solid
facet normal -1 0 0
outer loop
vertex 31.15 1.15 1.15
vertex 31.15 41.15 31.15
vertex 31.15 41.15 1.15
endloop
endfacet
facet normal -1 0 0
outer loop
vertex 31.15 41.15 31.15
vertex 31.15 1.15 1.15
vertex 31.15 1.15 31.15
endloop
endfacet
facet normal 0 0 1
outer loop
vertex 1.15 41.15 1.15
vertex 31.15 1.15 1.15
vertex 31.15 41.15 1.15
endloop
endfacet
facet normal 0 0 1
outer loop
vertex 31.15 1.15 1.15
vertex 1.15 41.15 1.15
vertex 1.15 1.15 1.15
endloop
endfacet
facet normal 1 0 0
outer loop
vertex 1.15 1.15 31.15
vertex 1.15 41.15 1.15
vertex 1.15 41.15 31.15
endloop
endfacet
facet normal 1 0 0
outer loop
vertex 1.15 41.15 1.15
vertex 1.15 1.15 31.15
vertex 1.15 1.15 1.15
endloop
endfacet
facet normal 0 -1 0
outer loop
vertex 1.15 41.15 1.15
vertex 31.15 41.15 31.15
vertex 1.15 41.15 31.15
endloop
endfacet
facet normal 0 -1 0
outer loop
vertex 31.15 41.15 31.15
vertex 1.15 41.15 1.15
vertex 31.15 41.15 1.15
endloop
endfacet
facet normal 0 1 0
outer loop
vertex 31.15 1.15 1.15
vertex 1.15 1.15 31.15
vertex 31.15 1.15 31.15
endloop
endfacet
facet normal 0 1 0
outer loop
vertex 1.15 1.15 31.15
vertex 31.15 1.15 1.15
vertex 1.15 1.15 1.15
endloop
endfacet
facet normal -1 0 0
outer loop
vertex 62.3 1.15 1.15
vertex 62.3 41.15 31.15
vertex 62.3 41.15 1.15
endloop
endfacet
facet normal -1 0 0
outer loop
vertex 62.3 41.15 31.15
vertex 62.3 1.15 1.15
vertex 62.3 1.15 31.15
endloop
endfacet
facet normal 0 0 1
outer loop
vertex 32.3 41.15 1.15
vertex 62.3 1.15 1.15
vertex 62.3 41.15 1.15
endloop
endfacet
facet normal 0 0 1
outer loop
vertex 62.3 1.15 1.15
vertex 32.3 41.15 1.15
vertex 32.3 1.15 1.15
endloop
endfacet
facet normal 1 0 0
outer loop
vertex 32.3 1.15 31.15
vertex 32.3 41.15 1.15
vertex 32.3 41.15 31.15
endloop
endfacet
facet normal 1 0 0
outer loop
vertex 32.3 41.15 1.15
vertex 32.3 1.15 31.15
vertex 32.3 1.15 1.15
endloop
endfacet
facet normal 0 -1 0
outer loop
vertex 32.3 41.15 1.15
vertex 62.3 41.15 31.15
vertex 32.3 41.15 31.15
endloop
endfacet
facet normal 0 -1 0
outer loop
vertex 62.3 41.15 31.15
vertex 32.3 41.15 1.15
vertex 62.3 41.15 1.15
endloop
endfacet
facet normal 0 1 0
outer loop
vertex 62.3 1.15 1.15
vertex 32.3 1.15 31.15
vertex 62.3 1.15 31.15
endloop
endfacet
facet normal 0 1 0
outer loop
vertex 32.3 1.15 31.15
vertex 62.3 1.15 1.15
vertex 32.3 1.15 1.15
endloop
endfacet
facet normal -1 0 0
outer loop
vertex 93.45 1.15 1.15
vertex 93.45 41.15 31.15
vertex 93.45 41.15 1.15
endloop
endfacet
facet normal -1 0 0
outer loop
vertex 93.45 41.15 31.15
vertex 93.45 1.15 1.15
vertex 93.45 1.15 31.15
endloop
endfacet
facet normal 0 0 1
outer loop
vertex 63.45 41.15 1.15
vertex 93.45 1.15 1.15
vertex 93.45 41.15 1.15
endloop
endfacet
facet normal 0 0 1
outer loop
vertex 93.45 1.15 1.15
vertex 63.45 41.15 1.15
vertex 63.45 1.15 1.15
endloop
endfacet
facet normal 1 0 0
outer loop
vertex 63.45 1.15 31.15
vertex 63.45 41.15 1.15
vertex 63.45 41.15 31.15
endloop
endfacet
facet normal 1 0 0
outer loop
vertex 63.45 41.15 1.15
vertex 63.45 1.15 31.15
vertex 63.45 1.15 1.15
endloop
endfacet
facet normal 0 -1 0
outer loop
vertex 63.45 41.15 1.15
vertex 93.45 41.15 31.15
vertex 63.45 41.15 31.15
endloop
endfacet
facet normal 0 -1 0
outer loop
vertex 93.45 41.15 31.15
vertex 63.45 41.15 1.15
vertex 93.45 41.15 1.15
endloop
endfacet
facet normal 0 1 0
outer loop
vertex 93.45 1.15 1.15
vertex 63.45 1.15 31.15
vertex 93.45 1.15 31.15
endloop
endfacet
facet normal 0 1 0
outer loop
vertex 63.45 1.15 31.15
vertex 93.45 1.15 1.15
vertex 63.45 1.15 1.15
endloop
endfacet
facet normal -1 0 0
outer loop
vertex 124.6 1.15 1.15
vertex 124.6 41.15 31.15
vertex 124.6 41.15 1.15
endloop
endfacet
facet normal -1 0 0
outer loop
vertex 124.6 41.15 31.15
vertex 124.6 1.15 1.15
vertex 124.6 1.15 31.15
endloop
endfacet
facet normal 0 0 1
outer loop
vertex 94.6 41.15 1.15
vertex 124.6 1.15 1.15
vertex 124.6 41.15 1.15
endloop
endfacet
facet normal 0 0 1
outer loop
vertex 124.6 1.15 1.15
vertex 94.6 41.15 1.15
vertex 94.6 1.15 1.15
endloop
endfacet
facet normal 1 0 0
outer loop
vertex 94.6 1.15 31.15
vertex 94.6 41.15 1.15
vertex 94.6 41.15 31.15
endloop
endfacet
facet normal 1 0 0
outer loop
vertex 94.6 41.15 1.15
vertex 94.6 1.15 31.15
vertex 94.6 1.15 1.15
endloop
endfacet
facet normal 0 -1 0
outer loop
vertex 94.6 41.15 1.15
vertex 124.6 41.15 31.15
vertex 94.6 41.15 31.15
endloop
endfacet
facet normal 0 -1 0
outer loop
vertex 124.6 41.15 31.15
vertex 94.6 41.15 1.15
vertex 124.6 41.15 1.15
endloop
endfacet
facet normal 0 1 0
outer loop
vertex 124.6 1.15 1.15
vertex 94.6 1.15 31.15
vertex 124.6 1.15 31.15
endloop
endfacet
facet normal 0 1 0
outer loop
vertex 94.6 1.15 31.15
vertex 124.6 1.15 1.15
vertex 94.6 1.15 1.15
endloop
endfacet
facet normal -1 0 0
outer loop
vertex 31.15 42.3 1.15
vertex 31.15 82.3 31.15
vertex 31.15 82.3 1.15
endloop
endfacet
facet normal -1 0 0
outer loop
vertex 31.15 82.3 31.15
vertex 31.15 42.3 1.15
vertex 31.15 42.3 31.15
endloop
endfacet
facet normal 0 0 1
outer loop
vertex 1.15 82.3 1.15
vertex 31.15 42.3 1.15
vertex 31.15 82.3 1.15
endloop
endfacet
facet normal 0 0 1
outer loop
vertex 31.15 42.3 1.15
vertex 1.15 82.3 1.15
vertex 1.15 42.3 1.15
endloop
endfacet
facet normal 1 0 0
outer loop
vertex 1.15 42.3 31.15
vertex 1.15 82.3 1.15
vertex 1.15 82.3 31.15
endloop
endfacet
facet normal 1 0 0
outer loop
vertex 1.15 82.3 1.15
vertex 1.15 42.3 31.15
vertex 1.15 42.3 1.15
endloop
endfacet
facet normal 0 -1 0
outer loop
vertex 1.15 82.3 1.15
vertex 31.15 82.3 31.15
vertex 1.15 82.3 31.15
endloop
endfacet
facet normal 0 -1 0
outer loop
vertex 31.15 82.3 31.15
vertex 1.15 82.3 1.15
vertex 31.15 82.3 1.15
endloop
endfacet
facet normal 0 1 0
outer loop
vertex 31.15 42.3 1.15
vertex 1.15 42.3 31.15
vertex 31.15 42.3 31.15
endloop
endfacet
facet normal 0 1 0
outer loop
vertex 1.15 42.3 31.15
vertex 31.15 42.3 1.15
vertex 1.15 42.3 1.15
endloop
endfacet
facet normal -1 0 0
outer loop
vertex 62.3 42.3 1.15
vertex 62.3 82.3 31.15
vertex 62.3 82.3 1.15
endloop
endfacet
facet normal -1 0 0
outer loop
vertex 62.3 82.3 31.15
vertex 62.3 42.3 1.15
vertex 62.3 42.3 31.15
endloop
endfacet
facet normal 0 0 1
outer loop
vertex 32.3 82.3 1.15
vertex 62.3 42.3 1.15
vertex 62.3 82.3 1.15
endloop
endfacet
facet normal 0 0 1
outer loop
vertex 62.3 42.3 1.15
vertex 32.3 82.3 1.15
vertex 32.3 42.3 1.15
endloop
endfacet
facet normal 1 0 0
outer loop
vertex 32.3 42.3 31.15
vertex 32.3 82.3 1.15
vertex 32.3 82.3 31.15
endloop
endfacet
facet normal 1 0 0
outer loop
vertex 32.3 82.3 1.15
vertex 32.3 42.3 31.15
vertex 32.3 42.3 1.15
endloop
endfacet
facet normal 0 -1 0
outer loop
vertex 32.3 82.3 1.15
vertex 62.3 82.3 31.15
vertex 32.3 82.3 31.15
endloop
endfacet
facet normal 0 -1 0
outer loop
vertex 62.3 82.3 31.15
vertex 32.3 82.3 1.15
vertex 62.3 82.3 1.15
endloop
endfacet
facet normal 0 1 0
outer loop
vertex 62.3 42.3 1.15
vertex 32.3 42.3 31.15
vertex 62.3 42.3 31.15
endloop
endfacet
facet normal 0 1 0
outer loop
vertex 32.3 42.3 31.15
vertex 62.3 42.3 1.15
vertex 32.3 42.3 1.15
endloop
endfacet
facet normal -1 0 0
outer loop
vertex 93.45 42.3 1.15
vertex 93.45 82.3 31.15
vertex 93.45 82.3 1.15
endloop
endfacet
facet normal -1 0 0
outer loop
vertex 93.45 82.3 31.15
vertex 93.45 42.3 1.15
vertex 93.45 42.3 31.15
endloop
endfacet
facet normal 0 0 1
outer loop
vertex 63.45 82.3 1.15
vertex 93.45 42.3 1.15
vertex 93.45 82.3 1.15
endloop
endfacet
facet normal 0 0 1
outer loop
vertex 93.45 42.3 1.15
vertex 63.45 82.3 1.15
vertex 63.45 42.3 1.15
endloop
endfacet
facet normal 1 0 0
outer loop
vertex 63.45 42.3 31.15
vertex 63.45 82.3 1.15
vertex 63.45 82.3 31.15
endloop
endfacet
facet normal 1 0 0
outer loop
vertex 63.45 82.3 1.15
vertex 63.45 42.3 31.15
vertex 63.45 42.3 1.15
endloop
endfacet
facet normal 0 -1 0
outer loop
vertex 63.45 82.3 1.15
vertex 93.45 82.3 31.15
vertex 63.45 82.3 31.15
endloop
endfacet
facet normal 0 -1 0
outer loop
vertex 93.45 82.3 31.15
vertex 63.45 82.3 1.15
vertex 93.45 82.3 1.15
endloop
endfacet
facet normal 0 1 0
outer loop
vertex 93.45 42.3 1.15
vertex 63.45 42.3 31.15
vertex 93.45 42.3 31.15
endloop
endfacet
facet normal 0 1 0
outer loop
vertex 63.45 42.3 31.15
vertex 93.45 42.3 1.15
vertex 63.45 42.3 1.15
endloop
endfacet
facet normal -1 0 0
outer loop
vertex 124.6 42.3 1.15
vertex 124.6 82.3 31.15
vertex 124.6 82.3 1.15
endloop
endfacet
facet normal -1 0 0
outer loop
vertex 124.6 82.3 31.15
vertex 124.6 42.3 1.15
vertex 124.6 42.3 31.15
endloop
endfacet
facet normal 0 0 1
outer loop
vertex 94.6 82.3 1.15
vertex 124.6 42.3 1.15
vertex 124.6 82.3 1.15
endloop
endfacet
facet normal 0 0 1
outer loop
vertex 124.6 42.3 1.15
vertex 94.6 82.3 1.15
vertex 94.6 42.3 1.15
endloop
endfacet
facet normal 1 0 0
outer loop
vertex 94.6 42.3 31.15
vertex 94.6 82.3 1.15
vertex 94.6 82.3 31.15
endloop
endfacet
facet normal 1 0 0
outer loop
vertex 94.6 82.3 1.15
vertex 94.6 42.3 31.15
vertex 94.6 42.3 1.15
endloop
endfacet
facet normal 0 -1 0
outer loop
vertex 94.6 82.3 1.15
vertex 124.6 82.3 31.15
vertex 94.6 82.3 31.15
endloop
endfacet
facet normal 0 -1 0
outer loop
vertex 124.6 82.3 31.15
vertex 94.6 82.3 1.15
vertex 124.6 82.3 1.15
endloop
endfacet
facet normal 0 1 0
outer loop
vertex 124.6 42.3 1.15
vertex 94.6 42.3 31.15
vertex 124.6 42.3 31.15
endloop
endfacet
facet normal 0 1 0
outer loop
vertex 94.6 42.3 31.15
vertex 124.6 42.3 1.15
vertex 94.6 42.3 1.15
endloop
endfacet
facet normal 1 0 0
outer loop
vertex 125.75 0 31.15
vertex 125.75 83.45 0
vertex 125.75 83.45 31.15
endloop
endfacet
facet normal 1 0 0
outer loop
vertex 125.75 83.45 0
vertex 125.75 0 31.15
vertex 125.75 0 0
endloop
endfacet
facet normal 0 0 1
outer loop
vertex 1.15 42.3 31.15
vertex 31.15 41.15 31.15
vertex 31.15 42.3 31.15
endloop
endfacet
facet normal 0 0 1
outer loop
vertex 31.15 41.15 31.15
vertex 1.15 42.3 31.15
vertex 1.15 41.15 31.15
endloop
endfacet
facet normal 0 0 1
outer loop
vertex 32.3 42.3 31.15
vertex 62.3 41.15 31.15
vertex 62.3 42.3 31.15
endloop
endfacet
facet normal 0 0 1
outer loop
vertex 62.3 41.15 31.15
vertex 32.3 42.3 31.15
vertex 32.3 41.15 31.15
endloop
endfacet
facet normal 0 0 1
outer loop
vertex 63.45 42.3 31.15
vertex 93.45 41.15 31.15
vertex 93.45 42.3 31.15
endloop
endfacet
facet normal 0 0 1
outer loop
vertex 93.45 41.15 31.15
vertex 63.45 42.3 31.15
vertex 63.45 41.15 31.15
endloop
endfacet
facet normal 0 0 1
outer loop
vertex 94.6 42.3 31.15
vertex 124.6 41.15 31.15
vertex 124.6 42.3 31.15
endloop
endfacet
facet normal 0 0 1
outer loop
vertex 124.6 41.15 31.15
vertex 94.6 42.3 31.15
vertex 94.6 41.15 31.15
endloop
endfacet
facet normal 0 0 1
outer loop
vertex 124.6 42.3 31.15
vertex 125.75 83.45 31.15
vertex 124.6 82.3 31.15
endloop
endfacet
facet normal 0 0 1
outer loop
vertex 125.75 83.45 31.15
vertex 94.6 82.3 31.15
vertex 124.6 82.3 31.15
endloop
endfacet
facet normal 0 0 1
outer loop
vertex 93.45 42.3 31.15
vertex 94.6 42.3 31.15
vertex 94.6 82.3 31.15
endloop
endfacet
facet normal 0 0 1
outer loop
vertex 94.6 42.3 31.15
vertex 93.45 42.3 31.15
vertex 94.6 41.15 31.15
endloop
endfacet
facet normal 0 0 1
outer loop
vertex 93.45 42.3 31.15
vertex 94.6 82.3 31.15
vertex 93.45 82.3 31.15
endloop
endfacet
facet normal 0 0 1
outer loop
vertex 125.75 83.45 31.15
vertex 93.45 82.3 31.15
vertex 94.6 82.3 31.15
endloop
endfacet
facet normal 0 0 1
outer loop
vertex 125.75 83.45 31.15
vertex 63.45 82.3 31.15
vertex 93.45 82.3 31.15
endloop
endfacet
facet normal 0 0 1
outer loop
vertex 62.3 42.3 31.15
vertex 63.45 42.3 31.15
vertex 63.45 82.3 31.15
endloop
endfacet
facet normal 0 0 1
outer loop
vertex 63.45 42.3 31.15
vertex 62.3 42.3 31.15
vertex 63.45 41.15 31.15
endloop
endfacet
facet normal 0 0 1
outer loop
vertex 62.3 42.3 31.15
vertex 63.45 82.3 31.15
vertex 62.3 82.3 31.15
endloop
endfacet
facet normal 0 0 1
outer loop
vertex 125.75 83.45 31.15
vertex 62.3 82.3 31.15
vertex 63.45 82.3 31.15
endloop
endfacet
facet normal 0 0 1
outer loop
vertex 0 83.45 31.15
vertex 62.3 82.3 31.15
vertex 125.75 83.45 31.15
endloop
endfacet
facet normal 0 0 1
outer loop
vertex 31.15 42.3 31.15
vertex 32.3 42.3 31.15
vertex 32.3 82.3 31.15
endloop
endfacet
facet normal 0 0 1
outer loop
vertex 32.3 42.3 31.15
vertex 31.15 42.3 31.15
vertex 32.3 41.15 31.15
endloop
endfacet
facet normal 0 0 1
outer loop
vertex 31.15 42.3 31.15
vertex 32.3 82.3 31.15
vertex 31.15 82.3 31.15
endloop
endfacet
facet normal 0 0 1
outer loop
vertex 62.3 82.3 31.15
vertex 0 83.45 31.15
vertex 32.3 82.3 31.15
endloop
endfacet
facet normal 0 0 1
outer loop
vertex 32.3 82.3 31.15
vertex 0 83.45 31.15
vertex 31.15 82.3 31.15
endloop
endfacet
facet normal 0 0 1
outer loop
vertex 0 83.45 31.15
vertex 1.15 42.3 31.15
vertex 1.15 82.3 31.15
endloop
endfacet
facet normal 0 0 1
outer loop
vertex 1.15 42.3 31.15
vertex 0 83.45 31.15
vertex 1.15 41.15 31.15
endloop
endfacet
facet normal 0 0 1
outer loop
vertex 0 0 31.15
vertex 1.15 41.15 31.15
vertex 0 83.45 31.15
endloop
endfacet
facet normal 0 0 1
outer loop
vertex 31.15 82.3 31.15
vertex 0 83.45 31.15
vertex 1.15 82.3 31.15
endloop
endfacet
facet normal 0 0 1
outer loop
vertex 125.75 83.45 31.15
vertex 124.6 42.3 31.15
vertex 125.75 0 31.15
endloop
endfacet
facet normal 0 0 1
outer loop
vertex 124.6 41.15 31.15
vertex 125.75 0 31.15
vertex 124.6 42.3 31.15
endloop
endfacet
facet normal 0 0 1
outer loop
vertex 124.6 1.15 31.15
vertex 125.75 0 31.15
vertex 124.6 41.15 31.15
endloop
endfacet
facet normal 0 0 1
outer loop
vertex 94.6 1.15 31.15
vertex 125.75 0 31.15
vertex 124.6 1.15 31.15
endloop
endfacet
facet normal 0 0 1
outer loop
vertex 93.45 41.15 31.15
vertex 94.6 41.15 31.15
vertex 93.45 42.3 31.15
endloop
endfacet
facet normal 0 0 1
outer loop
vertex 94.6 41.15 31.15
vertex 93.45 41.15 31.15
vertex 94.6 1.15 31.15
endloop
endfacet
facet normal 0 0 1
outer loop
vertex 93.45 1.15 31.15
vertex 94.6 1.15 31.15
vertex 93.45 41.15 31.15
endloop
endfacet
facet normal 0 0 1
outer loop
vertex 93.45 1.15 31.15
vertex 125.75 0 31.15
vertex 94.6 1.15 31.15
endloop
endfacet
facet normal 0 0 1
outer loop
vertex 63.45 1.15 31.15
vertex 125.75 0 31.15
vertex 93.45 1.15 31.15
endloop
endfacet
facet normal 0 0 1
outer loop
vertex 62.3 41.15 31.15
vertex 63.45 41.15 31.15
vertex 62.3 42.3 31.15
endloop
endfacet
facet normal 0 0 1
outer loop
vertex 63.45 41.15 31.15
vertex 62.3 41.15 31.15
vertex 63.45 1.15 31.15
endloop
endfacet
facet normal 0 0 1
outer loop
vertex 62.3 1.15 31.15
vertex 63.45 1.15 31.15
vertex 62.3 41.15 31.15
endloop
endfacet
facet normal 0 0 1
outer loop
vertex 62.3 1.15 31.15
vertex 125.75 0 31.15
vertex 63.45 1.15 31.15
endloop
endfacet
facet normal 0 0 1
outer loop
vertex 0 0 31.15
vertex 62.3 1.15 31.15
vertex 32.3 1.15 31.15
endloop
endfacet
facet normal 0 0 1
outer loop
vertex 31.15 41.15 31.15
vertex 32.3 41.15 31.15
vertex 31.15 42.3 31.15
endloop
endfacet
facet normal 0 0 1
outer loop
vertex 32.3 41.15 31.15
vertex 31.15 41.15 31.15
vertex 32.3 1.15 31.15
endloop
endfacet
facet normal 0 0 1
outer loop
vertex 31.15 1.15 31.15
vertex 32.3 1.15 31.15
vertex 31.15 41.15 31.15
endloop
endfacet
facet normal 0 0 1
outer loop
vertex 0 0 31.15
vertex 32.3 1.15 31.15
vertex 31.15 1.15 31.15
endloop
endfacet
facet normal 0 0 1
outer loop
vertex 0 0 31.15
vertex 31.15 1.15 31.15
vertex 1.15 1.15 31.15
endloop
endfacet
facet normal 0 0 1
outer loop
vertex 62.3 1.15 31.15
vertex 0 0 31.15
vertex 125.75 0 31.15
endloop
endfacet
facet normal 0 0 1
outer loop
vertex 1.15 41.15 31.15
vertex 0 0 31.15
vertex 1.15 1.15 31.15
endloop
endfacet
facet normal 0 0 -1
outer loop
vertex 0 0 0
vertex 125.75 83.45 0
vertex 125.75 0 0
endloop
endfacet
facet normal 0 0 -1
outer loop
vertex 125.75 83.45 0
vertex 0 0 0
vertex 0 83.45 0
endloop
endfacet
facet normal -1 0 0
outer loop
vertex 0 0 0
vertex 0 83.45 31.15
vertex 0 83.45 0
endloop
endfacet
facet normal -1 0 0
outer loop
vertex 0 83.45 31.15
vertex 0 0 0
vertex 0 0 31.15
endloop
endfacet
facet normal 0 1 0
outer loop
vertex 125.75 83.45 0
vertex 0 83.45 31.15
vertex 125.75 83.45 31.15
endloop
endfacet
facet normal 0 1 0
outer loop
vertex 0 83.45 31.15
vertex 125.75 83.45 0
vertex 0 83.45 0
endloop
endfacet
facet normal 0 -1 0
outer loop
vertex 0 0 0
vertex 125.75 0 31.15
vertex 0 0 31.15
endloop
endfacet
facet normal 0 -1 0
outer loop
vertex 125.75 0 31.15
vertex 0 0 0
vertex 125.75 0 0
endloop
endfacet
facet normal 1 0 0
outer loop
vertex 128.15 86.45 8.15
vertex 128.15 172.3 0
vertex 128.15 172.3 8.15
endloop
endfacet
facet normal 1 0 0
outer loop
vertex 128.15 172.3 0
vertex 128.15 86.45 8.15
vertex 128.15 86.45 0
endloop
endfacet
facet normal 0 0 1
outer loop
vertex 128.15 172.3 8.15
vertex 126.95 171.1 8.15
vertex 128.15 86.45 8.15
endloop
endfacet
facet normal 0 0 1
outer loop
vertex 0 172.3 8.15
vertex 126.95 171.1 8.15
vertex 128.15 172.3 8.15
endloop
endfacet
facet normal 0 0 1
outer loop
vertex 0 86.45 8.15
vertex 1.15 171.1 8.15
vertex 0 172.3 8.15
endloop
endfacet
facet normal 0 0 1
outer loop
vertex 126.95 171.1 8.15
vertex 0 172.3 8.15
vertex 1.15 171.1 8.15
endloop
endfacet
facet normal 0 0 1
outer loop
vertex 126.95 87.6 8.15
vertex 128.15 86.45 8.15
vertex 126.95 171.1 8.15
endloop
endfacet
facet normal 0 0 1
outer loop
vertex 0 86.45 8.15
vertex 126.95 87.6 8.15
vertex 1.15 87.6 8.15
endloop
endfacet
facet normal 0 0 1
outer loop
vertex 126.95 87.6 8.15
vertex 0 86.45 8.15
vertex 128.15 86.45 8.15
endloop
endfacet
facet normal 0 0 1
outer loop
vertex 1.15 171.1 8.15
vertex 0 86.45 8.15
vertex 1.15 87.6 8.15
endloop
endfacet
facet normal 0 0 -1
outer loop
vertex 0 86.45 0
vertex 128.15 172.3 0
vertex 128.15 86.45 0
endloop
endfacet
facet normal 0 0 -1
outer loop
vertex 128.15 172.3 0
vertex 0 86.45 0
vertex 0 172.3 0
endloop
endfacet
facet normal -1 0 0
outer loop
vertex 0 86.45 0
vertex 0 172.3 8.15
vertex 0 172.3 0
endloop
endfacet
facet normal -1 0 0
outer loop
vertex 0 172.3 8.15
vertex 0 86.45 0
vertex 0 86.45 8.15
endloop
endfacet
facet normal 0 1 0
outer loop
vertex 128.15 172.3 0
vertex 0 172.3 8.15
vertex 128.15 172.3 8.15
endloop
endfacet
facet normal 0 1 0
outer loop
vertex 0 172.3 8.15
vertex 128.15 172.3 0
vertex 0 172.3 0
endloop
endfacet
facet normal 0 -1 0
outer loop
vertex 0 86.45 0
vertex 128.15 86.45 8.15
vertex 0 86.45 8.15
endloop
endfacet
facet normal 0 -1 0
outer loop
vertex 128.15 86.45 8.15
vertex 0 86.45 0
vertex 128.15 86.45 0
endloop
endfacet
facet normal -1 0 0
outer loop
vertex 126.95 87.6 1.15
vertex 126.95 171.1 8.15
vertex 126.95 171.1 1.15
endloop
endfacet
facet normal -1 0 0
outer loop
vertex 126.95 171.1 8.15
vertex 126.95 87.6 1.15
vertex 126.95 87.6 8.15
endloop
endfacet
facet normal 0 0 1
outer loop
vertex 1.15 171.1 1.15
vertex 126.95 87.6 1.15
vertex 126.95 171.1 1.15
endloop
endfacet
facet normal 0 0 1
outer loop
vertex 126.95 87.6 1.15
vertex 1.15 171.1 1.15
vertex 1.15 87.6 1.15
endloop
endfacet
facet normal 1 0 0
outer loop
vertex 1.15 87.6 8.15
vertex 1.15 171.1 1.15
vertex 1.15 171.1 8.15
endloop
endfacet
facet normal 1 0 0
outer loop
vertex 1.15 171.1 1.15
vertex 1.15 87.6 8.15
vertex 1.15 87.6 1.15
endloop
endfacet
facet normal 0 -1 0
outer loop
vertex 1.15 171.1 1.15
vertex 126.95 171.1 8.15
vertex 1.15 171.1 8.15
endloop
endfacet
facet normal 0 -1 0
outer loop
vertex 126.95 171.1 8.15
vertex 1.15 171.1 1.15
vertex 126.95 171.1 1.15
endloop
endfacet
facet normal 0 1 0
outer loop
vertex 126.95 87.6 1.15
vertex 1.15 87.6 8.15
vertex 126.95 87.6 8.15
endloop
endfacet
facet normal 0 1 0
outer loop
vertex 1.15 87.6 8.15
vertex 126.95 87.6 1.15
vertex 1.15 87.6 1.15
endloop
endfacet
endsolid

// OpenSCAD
/* [Global] */


// Whether or not to generate the box
generate_box="yes"; //[yes, no]

// Whether or not to generate the lid
generate_lid="yes"; //[yes, no]

showlid = generate_lid=="yes"? true : false;

showbox = generate_box=="yes"? true : false;

Type_of_Lid = "Standard";//[Standard, Sliding]




// Size of compartments, X
compx = 30;	


// Size of compartments, Y
compy = 40;	


// Width of wall, Make slightly larger then n*nozzle diameter. i.e. 1.15 for a 0.5 nozzle, should give a 2-pass thick wall
wall = 1.15;


// Number of compartments, X
nox = 4;


// Number of compartments, Y
noy = 2;



// Depth of compartments
deep = 30;	





// Tolerance around lid.  If it's too tight, increase this. If it's too loose, decrease it. 0.15 recommended for sliding lid
tolerance=.05;



// This is how far away from the box to print the lid
lidoffset=3;		


// How far the lid goes down the sides of the box. Only applies to Standard lid
lid_drop=7;
lidheight=lid_drop+wall;

//Adds a divit to sliding lid to make opening easer, no effect on standard lid
Thumb_Divit="yes"; //[yes, no]

includethumbhole = Thumb_Divit =="no"? false : true;


//Add a coin slot above every compartment
Coin_Slot="no"; //[yes, no]

includecoinslot=Coin_Slot == "no"? false: true;


//Size of Coin slot in X direction, default is slot thickness for United States Coins. Reverse X and Y to swap direction of slot
coinx=2.5;	
//Size of Coin slot in Y direction, default is slot width for United States Coins. Reverse X and Y to swap direction of slot
coiny=26;	



/* [Hidden] */

lidtype = Type_of_Lid == "Standard"? 0 : 1;	// 0=Flat lid.  Use "1" for lid that slides off in the x direction



				// Z tolerance can be tweaked separately, to make the top of the sliding lid
				// be flush with the top of the box itself.  Default is zero.  Warning: this also
				// adds wiggle room to the lid.
                //Hidden from customizer, because more likely to mess up the box then help it.
ztolerance=0;

////////////////////
//start of objects
////////////////////

totalheight = deep + (lidtype*wall);
thumbrad = min(20,noy*(compy+wall)/3);

if (showbox) {
difference() {
	cube ( size = [nox * (compx + wall) + wall, noy * (compy + wall) + wall, (totalheight + wall)], center = false);


	for ( ybox = [ 0 : noy - 1])
		{
             for( xbox = [ 0 : nox - 1])
			{
			translate([ xbox * ( compx + wall ) + wall, ybox * ( compy + wall ) + wall, wall])
			cube ( size = [ compx, compy, totalheight+1 ]);
			}
		}
	if (lidtype==1) {
			translate ([0,wall/2,deep+wall]) 
			polyhedron ( points = [   
							[0,0,0], 
							[0,noy*(compy+wall),0], 
							[nox*(compx+wall)+wall/2,0,0], 
							[nox*(compx+wall)+wall/2,noy*(compy+wall),0],
							[0,wall/2,wall], 
							[0,noy*(compy+wall)-wall/2,wall], 
							[nox*(compx+wall)+wall/2,wall/2,wall], 
							[nox*(compx+wall)+wall/2,noy*(compy+wall)-wall/2,wall]
							],
						faces = [ 
							[0,2,1], [1,2,3], [4,5,6], [5,7,6]	,		// top and bottom
							[0,4,2], [4,6,2], [5,3,7], [5,1,3]	,		// angled sides
							[0,1,4], [1,5,4], [2,6,3], [3,6,7]			// trapezoidal ends
							]);
			translate ([0,wall/2,deep+wall-ztolerance])
			cube (size=[nox*(compx+wall)+wall/2,noy*(compy+wall),ztolerance],center=false);
			}

	}
}

if (showlid) {
translate ([0,noy*(compy+wall)+wall+lidoffset,0])
difference () { union () {	// for including coin slot
	if (lidtype==1) { 
		difference () {
		polyhedron ( points = [   
						[0,0,0], 
						[0,noy*(compy+wall)-2*tolerance,0], 
						[nox*(compx+wall)-tolerance+wall/2,0,0], 
						[nox*(compx+wall)-tolerance+wall/2,noy*(compy+wall)-2*tolerance,0],
						[0,wall/2,wall], 
						[0,noy*(compy+wall)-wall/2-2*tolerance,wall], 
						[nox*(compx+wall)-tolerance+wall/2,wall/2,wall], 
						[nox*(compx+wall)-tolerance+wall/2,noy*(compy+wall)-wall/2-2*tolerance,wall]
						],
					faces = [ 
						[0,2,1], [1,2,3], [4,5,6], [5,7,6]	,		// top and bottom
						[0,4,2], [4,6,2], [5,3,7], [5,1,3]	,		// angled sides
						[0,1,4], [1,5,4], [2,6,3], [3,6,7]			// trapezoidal ends
						]);
		// Thumb hole
		if (includethumbhole==true) {
			intersection () {
			translate ([min(8,nox*(compx+wall)/8),(noy*(compy+wall))/2,thumbrad+wall/2]) sphere (r=thumbrad, center=true, $fn=50);
			translate ([min(8,nox*(compx+wall)/8),0,0]) cube (size=[20,(noy*(compy+wall)),20], center=false);
		}
	}

		}
	} else {

	difference() {
	cube ( size = [nox * (compx + wall) + 3 * wall + 2* tolerance, noy * (compy + wall) + 3 * wall + 2*tolerance, lidheight], center = false);

	translate ([wall,wall,wall])
	cube ( size = [nox * (compx + wall) +wall+tolerance, noy * (compy + wall) + wall + tolerance, lidheight+1], center = false);
	}
} // if lidtype
} // union
if (includecoinslot==true) {
	for ( yslot = [ 0 : noy - 1])
		{
             for( xslot = [ 0 : nox - 1])
			{
			translate([ xslot * ( compx + wall ) + (2-lidtype)*wall + (compx-coinx)/2, yslot * ( compy + wall ) + wall*(2-3*lidtype/2) + (compy-coiny)/2, 0])
			cube ( size = [ coinx, coiny, wall ]);
			}
		}
	}
} //difference
} // if showlid
